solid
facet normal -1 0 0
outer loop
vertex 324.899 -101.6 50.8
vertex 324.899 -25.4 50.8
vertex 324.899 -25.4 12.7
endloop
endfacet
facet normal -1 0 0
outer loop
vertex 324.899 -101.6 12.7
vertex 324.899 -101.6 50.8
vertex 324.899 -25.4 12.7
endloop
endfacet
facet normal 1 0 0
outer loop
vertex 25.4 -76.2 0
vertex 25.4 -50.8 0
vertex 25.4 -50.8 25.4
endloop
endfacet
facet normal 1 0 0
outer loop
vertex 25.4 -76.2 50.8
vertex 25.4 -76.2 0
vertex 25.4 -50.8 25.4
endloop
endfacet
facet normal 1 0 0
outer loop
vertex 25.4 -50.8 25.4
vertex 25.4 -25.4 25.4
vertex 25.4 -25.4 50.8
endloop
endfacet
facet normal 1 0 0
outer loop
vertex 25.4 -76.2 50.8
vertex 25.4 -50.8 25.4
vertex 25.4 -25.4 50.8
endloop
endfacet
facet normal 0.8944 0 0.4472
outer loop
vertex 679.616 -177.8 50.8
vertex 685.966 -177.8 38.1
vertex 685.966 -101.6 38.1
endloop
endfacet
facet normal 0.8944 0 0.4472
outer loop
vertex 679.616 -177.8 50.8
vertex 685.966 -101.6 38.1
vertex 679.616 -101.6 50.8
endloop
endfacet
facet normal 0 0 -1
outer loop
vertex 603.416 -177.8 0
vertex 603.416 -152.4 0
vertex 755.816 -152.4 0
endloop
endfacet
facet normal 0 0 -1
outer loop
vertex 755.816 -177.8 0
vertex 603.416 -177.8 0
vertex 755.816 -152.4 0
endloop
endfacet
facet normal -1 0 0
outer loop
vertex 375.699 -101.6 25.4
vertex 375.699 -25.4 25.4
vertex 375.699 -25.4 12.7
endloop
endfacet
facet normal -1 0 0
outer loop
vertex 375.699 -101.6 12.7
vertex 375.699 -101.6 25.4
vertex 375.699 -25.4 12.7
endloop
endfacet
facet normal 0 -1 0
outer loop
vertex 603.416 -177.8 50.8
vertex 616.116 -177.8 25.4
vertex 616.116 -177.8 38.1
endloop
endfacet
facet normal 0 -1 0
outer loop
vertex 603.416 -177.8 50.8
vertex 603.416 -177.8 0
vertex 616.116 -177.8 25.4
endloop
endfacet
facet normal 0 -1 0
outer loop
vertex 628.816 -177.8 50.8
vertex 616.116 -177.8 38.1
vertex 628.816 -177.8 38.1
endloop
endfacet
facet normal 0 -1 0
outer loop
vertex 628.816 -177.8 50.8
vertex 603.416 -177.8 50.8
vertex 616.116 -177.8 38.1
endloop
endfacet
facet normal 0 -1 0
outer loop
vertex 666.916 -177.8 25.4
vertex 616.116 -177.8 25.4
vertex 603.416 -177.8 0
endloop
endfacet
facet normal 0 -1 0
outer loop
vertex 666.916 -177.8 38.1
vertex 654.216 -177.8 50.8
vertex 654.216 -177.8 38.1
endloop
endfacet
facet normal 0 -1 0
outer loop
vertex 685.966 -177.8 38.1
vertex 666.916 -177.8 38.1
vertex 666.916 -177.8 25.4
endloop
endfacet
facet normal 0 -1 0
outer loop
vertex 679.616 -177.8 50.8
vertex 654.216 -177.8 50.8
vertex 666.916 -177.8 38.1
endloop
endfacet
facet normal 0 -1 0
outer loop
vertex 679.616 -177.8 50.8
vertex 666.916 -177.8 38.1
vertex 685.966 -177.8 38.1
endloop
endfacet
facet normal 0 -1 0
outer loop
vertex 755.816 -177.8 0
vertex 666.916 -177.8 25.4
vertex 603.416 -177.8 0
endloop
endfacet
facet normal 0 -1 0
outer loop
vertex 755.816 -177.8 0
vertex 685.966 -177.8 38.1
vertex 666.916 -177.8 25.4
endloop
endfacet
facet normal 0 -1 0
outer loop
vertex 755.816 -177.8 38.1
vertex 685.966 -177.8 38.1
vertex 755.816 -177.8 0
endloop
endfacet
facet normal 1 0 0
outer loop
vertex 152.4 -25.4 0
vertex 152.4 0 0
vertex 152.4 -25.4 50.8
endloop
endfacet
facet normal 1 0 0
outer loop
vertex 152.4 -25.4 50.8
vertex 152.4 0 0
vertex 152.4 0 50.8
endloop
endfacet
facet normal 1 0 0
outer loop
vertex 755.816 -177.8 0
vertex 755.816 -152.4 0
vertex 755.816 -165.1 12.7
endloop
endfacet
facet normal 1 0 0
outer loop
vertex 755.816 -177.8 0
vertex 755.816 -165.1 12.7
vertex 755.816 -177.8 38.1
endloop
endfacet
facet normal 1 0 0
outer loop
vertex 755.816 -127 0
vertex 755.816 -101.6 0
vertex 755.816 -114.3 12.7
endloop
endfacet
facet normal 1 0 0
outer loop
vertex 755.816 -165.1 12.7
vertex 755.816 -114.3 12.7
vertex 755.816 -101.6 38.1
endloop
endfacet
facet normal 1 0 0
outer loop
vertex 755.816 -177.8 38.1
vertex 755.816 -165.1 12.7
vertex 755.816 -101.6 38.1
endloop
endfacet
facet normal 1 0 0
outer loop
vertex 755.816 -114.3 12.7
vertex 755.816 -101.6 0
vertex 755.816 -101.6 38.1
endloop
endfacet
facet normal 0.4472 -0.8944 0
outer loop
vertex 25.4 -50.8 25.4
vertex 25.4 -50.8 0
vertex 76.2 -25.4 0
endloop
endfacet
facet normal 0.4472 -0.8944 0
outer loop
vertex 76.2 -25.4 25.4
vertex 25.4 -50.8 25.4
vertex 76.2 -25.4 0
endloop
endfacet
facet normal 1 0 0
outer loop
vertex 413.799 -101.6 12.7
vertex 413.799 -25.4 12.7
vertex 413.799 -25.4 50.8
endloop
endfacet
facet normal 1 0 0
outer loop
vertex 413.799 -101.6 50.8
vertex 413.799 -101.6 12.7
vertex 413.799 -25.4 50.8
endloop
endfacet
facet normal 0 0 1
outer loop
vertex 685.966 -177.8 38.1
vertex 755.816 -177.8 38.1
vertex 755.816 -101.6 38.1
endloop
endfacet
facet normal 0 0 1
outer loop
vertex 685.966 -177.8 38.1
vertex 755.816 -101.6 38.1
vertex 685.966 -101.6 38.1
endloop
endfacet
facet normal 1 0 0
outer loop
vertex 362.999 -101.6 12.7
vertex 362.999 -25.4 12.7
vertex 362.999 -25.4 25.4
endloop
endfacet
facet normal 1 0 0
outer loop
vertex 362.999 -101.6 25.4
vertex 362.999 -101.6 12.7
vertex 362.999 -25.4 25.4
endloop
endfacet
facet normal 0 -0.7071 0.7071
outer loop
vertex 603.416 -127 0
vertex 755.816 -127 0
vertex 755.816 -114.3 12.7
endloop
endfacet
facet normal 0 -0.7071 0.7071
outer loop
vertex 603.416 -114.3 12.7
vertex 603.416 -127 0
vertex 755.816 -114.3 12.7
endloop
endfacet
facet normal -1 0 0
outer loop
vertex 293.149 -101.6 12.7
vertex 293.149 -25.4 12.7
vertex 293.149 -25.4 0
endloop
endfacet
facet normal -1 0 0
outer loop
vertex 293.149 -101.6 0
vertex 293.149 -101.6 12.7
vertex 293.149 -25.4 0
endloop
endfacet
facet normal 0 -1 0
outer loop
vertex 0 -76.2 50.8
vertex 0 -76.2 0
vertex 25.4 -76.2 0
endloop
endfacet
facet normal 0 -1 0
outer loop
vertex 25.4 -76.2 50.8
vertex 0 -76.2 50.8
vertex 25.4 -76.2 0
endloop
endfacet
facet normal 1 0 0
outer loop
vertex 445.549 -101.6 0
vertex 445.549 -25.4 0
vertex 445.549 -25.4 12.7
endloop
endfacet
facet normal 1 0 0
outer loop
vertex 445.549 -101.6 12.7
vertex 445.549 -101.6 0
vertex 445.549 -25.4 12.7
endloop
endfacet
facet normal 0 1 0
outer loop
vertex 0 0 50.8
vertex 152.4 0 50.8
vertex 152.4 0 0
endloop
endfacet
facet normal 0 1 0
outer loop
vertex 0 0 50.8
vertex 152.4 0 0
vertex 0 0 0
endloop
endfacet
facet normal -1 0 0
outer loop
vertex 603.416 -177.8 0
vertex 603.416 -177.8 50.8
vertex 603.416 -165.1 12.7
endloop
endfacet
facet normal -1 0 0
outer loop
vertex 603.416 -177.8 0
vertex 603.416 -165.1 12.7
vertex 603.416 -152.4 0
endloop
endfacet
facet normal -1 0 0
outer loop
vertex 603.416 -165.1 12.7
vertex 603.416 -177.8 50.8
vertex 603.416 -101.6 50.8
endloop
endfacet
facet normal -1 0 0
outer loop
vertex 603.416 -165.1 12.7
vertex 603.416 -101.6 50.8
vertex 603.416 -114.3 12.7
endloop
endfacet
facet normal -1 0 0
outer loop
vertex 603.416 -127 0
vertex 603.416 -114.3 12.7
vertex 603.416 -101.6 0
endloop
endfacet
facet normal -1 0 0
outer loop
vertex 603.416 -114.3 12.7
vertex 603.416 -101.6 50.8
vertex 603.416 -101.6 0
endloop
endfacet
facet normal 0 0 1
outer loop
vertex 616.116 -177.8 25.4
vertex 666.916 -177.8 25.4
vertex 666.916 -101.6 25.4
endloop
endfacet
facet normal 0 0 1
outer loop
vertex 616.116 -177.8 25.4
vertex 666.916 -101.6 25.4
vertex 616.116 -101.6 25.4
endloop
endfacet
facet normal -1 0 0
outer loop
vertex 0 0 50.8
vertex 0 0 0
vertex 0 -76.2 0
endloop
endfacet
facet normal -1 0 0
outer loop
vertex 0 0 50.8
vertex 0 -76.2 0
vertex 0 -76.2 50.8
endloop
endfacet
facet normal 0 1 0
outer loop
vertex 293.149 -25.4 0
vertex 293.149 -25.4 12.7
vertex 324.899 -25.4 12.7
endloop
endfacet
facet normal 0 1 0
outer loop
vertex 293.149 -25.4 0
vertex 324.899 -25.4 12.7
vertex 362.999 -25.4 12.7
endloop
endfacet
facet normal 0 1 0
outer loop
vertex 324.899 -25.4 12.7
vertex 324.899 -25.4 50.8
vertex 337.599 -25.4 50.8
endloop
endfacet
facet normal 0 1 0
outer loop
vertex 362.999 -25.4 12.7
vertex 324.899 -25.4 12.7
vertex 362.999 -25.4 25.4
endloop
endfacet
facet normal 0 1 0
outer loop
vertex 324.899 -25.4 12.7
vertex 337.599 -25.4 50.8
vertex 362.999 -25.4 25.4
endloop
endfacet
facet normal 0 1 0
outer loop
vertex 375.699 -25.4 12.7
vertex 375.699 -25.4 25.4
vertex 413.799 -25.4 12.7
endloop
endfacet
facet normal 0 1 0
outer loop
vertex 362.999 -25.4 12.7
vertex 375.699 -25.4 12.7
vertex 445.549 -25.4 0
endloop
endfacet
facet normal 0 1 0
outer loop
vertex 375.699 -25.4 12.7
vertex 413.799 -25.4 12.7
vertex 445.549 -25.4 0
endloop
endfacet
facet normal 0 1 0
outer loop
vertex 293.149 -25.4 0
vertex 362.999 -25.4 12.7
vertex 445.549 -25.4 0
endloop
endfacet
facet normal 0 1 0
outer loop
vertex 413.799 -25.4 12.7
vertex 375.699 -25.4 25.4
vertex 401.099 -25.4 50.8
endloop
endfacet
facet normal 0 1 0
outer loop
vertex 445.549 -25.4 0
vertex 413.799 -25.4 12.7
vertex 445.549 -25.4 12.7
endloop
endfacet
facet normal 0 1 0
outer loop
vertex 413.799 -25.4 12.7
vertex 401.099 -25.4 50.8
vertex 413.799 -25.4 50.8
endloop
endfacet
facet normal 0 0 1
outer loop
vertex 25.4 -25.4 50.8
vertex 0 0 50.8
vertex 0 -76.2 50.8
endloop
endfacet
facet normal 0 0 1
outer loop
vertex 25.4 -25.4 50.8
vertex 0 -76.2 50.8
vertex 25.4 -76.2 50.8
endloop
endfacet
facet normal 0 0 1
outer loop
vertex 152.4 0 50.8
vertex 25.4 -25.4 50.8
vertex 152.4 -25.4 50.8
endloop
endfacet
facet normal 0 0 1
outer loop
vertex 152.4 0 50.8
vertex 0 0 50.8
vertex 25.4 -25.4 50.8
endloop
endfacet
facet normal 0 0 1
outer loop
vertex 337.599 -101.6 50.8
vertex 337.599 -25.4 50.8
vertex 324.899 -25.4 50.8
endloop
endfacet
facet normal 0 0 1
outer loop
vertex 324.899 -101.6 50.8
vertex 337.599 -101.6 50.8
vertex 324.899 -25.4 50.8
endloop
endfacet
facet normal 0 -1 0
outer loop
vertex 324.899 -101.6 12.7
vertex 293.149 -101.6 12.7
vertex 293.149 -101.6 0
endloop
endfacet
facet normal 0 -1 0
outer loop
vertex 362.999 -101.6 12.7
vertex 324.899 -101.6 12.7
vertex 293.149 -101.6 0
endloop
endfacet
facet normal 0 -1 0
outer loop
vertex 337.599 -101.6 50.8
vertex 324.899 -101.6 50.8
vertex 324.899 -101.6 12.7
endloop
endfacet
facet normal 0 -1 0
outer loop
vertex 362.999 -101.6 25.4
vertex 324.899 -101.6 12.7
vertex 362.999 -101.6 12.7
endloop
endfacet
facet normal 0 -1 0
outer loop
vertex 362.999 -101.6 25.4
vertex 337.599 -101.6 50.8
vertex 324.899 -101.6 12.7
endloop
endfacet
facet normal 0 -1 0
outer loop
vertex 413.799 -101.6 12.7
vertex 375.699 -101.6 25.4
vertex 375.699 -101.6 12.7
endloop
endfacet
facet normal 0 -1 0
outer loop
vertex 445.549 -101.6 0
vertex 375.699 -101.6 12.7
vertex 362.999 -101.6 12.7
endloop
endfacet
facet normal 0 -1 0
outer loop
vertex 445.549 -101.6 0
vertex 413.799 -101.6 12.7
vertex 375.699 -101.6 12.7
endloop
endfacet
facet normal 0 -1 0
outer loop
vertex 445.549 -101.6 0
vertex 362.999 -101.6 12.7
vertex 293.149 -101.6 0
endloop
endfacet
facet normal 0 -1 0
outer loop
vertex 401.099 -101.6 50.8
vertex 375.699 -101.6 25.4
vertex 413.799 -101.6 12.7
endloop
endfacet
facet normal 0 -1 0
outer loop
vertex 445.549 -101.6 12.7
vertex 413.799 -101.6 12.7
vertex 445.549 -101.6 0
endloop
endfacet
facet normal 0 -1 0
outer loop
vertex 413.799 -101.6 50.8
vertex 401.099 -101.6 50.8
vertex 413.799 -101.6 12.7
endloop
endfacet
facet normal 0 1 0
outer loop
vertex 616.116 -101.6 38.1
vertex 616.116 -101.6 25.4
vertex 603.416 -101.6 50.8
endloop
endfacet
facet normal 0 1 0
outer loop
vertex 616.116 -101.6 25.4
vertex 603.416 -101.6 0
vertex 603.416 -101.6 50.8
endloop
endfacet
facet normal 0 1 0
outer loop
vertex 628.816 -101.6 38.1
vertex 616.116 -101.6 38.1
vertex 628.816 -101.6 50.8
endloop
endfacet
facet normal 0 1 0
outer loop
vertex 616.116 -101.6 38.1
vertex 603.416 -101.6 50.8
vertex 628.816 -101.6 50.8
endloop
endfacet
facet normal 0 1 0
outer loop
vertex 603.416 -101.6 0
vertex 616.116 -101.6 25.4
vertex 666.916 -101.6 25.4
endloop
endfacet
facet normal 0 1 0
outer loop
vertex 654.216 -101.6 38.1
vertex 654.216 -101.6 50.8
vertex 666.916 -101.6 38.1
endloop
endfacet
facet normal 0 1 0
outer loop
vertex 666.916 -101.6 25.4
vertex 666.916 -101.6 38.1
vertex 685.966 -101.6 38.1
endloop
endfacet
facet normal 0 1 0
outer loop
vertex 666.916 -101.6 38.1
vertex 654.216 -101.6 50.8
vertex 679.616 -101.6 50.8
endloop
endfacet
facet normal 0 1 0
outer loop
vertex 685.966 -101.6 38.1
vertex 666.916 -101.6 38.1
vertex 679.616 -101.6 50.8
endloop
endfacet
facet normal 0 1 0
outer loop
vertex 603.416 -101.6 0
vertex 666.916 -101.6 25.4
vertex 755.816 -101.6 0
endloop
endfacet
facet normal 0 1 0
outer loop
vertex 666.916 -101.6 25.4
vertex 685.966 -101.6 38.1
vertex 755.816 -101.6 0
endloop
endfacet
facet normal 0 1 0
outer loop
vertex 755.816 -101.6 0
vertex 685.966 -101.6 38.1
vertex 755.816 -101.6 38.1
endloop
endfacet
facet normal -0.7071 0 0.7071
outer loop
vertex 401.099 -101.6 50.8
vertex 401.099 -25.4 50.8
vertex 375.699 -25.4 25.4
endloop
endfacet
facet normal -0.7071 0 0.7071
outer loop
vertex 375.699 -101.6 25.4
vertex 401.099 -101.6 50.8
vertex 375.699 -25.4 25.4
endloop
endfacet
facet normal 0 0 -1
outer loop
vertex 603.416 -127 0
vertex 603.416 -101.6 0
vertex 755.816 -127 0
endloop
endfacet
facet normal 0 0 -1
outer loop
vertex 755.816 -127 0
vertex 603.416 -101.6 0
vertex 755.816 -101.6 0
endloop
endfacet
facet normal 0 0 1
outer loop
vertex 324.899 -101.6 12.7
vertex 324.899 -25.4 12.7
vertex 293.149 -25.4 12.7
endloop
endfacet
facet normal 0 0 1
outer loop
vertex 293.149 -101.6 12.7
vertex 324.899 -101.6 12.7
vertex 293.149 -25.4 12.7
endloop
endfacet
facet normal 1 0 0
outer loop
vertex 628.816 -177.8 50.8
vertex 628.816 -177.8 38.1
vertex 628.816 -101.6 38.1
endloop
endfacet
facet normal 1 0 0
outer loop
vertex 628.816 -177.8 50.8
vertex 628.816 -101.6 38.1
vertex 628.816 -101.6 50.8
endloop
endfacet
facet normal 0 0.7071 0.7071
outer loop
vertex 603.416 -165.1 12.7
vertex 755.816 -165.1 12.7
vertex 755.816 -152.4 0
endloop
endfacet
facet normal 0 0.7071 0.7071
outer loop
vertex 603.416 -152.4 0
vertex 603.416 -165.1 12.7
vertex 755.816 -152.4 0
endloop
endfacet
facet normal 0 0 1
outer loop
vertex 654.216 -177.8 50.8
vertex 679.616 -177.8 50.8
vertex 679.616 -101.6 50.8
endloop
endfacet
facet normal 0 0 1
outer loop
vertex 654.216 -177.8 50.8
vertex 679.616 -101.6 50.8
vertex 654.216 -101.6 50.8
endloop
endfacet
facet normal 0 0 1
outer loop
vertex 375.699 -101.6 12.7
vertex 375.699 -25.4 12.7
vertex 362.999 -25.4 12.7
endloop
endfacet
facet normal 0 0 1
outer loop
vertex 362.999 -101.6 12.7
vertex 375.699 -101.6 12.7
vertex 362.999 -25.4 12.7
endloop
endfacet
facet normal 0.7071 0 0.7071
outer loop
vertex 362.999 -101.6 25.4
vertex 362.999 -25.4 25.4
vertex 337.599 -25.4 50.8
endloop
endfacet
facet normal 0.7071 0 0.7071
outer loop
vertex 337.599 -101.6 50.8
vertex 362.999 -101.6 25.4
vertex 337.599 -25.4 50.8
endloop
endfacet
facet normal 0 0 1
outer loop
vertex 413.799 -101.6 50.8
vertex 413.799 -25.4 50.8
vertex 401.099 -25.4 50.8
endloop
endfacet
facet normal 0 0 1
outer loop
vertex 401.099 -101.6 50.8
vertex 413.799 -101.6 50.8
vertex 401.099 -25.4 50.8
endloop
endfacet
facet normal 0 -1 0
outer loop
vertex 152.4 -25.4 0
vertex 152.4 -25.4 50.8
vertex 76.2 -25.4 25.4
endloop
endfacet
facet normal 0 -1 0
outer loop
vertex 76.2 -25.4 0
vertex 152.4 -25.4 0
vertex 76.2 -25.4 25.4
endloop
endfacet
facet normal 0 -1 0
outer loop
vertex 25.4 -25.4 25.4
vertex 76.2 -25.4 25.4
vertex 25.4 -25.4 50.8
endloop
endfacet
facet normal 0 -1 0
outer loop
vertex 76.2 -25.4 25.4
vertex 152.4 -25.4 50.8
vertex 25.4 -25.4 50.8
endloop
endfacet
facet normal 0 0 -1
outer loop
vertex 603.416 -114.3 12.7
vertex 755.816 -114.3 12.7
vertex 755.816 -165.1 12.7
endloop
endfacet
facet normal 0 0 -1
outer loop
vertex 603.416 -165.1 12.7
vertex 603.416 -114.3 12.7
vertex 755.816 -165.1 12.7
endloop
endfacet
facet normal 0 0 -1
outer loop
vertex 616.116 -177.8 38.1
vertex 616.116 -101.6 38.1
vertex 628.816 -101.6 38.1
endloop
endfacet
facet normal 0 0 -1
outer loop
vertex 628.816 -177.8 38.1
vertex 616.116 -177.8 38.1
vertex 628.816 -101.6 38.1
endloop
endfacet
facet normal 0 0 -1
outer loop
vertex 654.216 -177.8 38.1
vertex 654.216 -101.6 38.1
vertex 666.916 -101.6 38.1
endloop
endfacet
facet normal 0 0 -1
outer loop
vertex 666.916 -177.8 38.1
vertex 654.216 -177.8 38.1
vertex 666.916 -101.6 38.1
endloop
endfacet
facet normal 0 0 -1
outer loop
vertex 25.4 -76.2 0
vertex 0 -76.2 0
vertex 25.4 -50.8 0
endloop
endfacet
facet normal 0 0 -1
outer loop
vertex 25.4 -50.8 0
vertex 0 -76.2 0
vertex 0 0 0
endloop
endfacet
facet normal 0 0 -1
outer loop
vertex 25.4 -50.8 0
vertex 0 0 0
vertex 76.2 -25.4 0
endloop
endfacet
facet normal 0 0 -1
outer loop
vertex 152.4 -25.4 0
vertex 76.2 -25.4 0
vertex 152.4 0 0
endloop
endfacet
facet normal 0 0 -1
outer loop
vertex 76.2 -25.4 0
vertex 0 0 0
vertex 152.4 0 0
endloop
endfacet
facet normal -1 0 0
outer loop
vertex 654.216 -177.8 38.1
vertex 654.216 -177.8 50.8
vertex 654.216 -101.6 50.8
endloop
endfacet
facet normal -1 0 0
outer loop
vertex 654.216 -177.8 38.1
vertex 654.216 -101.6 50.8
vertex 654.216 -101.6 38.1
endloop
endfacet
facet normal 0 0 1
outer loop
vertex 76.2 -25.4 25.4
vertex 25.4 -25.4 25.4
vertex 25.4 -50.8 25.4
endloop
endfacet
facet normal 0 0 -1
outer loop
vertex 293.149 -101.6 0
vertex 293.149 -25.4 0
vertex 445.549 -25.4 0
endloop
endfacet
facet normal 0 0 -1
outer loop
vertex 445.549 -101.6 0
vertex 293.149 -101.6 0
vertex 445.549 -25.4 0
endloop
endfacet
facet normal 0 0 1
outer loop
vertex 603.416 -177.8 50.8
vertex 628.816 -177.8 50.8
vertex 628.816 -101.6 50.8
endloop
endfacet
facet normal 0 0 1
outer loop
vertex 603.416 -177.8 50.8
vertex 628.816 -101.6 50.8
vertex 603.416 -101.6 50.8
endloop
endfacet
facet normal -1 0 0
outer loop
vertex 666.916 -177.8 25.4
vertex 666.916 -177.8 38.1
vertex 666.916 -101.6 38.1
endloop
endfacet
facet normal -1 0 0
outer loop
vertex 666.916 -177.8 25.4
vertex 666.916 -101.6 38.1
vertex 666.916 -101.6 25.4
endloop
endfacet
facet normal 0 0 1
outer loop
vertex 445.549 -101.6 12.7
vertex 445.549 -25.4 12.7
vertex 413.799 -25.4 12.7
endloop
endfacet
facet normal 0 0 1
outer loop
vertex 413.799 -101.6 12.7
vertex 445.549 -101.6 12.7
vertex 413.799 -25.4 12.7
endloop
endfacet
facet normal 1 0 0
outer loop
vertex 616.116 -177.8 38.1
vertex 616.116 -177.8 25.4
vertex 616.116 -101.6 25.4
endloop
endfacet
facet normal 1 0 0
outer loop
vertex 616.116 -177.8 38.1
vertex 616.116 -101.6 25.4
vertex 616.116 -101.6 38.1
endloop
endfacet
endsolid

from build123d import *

# Parameters (mm, degrees)
F0_W      = 25.4
F0_H      = 50.8
F1_DEPTH  = 76.2
F2_W      = 127
F2_H      = 50.8
F2_W_2    = 25.4
F3_DEPTH  = 25.4
F5_DEPTH  = 25.4
F7_DEPTH  = 76.2
F9_DEPTH  = 76.2
F11_DEPTH = 152.4


with BuildPart() as f1:
    # F0 (on Front) → F1 (new body)
    with BuildSketch(Plane.XZ):
        with Locations((12.7, 25.4)):
            Rectangle(F0_W, F0_H)
    extrude(amount=F1_DEPTH)

    # F2 (on face) → F3 (join)
    with BuildSketch(Plane(origin=(0, 0, 0), x_dir=(-1, 0, 0), z_dir=(0, 1, 0))):
        with Locations((-88.9, 25.4)):
            Rectangle(F2_W, F2_H)
        with Locations((-12.7, 25.4)):
            Rectangle(F2_W_2, F2_H)
    extrude(amount=-F3_DEPTH)

    # F4 (on Top) → F5 (join)
    with BuildSketch(Plane.XY):
        Polygon((76.2, -25.4), (25.4, -25.4), (25.4, -50.8), align=None)
    extrude(amount=F5_DEPTH)


with BuildPart() as f7:
    # F6 (on face) → F7 (new body)
    with BuildSketch(Plane.XZ.offset(25.4)):
        Polygon((293.148958, 12.7), (293.148958, 0), (445.548958, 0), (445.548958, 12.7), (413.798958, 12.7), (413.798958, 50.8), (401.098958, 50.8), (375.698958, 25.4), (375.698958, 12.7), (362.998958, 12.7), (362.998958, 25.4), (337.598958, 50.8), (324.898958, 50.8), (324.898958, 12.7), align=None)
    extrude(amount=F7_DEPTH)


with BuildPart() as f9:
    # F8 (on face) → F9 (new body)
    with BuildSketch(Plane.XZ.offset(101.6)):
        Polygon((603.416416, 50.8), (603.416416, 0), (755.816416, 0), (755.816416, 38.1), (685.966416, 38.1), (679.616416, 50.8), (654.216416, 50.8), (654.216416, 38.1), (666.916416, 38.1), (666.916416, 25.4), (616.116416, 25.4), (616.116416, 38.1), (628.816416, 38.1), (628.816416, 50.8), align=None)
    extrude(amount=F9_DEPTH)

    # F10 (on face) → F11 (cut)
    with BuildSketch(Plane.YZ.offset(755.816416)):
        Polygon((-165.1, 12.7), (-152.4, 0), (-127, 0), (-114.3, 12.7), (-139.7, 12.7), align=None)
    extrude(amount=-F11_DEPTH, mode=Mode.SUBTRACT)


solid = Compound([f1.part, f7.part, f9.part])
